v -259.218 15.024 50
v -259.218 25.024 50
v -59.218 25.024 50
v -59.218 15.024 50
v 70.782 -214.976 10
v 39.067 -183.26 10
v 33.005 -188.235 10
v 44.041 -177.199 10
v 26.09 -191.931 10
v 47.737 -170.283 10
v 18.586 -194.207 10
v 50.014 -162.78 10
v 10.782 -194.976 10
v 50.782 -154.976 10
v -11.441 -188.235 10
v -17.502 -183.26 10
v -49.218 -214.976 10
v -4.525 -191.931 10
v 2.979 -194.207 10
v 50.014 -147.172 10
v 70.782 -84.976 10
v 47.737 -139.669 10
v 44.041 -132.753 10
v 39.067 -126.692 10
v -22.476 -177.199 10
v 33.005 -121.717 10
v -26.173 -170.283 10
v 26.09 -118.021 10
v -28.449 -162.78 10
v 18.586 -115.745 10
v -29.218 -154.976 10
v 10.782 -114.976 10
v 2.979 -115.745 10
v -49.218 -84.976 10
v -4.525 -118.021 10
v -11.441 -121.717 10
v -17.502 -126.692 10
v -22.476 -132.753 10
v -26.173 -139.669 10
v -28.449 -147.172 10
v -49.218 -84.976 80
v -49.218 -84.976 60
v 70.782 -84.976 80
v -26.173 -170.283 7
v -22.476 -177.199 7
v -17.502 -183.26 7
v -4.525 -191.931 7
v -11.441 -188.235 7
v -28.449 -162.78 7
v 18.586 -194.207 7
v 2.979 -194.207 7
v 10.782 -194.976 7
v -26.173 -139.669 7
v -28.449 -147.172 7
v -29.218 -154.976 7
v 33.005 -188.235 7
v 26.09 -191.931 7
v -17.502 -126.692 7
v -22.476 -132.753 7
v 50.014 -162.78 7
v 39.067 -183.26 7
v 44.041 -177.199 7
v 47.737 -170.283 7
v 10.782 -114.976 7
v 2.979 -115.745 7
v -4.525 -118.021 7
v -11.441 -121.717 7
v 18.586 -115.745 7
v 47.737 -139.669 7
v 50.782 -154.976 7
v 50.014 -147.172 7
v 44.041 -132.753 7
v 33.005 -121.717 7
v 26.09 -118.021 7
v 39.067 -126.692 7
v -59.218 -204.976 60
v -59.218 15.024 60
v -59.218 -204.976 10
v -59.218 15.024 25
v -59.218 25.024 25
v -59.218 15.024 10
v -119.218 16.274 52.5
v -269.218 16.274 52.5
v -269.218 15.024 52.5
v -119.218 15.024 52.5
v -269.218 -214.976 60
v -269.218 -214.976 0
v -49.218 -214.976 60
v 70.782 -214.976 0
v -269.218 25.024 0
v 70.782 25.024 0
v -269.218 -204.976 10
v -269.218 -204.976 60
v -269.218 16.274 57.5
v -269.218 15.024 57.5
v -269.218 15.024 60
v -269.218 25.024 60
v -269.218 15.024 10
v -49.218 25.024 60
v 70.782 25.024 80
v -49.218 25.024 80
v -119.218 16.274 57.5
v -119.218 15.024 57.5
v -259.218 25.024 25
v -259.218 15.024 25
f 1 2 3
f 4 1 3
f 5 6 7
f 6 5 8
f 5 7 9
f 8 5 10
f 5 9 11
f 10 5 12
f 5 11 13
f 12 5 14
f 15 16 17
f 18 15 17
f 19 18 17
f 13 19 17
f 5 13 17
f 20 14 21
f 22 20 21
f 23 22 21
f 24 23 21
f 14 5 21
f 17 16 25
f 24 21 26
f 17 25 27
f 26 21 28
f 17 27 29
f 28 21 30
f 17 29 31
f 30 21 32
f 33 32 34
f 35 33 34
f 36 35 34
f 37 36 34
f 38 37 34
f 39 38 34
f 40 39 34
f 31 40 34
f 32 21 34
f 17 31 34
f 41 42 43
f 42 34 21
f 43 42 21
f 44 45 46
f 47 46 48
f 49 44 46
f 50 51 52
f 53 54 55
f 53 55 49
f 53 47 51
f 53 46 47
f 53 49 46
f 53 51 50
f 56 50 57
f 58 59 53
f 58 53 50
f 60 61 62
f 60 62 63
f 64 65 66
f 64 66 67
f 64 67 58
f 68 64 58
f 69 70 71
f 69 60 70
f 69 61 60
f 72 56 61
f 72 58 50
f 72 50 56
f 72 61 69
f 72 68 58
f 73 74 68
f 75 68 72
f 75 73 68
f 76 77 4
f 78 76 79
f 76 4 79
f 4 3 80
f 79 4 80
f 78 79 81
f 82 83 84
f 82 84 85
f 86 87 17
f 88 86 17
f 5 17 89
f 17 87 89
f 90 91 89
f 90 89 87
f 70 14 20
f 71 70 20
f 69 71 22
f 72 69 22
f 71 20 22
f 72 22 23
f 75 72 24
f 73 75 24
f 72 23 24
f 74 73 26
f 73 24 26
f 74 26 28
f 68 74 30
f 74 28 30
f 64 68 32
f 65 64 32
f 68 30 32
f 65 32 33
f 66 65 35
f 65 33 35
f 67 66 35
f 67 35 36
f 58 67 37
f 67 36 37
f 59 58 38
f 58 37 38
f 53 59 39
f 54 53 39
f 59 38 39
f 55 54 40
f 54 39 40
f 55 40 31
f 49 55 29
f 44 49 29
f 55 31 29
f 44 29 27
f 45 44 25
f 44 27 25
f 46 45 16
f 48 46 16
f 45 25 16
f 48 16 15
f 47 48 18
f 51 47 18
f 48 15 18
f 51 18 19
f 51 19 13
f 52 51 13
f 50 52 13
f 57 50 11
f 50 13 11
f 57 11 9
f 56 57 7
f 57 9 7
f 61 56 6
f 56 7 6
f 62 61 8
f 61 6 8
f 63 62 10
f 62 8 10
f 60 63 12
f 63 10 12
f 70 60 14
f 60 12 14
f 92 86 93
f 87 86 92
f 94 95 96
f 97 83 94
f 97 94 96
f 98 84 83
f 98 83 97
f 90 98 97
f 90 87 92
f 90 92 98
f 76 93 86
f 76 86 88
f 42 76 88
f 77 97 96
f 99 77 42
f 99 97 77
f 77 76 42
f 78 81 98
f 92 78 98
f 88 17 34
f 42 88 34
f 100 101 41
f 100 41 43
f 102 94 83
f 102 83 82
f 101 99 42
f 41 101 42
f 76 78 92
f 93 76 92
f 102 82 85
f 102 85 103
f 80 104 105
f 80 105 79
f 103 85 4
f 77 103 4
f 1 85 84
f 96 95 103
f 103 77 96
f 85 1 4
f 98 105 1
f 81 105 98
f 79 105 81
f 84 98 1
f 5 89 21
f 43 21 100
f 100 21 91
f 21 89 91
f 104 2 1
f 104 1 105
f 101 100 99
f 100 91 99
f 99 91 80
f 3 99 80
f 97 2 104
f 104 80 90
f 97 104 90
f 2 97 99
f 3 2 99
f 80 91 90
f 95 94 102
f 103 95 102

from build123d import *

# Parameters (mm, degrees)
RESSALTO_EXTRUS_O1_DEPTH   = 10
ESBO_O2_W                  = 10
ESBO_O2_H                  = 10
ESBO_O2_W_2                = 210
ESBO_O2_H_2                = 220
RESSALTO_EXTRUS_O4_DEPTH   = 50
ESBO_O7_R                  = 40
CORTE_EXTRUS_O1_DEPTH      = 3
ESBO_O21_W                 = 200
ESBO_O21_H                 = 25
CORTE_EXTRUS_O5_DEPTH      = 100
CORTE_EXTRUS_O6_DEPTH      = 161.25
CORTE_EXTRUS_O6_DEPTH_BACK = 1.25
ESBO_O23_W                 = 150
ESBO_O23_H                 = 5
RESSALTO_EXTRUS_O5_DEPTH   = 70


with BuildPart() as part:
    # Esboço1 → Ressalto-extrusão1 (new body)
    with BuildSketch(Plane.XY):
        Polygon((-99.217703787, 25.02394247), (70.782296213, 25.02394247), (70.782296213, 0), (70.782296213, -214.97605753), (-99.217703787, -214.97605753), (-269.217703787, -214.97605753), (-269.217703787, 0), (-269.217703787, 25.02394247), align=None)
    extrude(amount=RESSALTO_EXTRUS_O1_DEPTH)

    # Esboço2 → Ressalto-extrusão4 (add)
    with BuildSketch(Plane.XY.offset(10)):
        with Locations((-54.217703787, -209.97605753)):
            Rectangle(ESBO_O2_W, ESBO_O2_H)
        with Locations((-164.217703787, -209.97605753)):
            Rectangle(ESBO_O2_W_2, ESBO_O2_H)
        with Locations((-54.217703787, -94.97605753)):
            Rectangle(ESBO_O2_W, ESBO_O2_H_2)
        Polygon((-59.217703787, 15.02394247), (-49.217703787, 15.02394247), (-49.217703787, 25.02394247), (-269.217703787, 25.02394247), (-269.217703787, 15.02394247), align=None)
    extrude(amount=RESSALTO_EXTRUS_O4_DEPTH)

    # Esboço7 → Corte-extrusão1 (cut)
    with BuildSketch(Plane.XY.offset(10)):
        with Locations((10.782296213, -154.97605753)):
            Circle(ESBO_O7_R)
    extrude(amount=-CORTE_EXTRUS_O1_DEPTH, mode=Mode.SUBTRACT)

    # Esboço21 → Corte-extrusão5 (cut)
    with BuildSketch(Plane(origin=(0, 25.02394247, 0), x_dir=(1, 0, 0), z_dir=(0, 1, 0))):
        with Locations((-159.217703787, -37.5)):
            Rectangle(ESBO_O21_W, ESBO_O21_H)
    extrude(amount=-CORTE_EXTRUS_O5_DEPTH, mode=Mode.SUBTRACT)

    # Esboço23 → Corte-extrusão6 (cut, two sides: drawn at the far end of the back side and taken through both)
    with BuildSketch(Plane.XZ.offset(-15.02394247).offset(-CORTE_EXTRUS_O6_DEPTH_BACK)):
        with Locations((-194.217703787, 55)):
            Rectangle(ESBO_O23_W, ESBO_O23_H)
    extrude(amount=CORTE_EXTRUS_O6_DEPTH + CORTE_EXTRUS_O6_DEPTH_BACK, mode=Mode.SUBTRACT)

    # Esboço28 → Ressalto-extrusão5 (add)
    with BuildSketch(Plane.XY.offset(10)):
        Polygon((70.782296213, -84.97605753), (70.782296213, 25.02394247), (60.782296213, 25.02394247), (-39.217703787, 25.02394247), (-49.217703787, 25.02394247), (-49.217703787, -74.97605753), (-49.217703787, -84.97605753), align=None)
    extrude(amount=RESSALTO_EXTRUS_O5_DEPTH)


solid = part.part
